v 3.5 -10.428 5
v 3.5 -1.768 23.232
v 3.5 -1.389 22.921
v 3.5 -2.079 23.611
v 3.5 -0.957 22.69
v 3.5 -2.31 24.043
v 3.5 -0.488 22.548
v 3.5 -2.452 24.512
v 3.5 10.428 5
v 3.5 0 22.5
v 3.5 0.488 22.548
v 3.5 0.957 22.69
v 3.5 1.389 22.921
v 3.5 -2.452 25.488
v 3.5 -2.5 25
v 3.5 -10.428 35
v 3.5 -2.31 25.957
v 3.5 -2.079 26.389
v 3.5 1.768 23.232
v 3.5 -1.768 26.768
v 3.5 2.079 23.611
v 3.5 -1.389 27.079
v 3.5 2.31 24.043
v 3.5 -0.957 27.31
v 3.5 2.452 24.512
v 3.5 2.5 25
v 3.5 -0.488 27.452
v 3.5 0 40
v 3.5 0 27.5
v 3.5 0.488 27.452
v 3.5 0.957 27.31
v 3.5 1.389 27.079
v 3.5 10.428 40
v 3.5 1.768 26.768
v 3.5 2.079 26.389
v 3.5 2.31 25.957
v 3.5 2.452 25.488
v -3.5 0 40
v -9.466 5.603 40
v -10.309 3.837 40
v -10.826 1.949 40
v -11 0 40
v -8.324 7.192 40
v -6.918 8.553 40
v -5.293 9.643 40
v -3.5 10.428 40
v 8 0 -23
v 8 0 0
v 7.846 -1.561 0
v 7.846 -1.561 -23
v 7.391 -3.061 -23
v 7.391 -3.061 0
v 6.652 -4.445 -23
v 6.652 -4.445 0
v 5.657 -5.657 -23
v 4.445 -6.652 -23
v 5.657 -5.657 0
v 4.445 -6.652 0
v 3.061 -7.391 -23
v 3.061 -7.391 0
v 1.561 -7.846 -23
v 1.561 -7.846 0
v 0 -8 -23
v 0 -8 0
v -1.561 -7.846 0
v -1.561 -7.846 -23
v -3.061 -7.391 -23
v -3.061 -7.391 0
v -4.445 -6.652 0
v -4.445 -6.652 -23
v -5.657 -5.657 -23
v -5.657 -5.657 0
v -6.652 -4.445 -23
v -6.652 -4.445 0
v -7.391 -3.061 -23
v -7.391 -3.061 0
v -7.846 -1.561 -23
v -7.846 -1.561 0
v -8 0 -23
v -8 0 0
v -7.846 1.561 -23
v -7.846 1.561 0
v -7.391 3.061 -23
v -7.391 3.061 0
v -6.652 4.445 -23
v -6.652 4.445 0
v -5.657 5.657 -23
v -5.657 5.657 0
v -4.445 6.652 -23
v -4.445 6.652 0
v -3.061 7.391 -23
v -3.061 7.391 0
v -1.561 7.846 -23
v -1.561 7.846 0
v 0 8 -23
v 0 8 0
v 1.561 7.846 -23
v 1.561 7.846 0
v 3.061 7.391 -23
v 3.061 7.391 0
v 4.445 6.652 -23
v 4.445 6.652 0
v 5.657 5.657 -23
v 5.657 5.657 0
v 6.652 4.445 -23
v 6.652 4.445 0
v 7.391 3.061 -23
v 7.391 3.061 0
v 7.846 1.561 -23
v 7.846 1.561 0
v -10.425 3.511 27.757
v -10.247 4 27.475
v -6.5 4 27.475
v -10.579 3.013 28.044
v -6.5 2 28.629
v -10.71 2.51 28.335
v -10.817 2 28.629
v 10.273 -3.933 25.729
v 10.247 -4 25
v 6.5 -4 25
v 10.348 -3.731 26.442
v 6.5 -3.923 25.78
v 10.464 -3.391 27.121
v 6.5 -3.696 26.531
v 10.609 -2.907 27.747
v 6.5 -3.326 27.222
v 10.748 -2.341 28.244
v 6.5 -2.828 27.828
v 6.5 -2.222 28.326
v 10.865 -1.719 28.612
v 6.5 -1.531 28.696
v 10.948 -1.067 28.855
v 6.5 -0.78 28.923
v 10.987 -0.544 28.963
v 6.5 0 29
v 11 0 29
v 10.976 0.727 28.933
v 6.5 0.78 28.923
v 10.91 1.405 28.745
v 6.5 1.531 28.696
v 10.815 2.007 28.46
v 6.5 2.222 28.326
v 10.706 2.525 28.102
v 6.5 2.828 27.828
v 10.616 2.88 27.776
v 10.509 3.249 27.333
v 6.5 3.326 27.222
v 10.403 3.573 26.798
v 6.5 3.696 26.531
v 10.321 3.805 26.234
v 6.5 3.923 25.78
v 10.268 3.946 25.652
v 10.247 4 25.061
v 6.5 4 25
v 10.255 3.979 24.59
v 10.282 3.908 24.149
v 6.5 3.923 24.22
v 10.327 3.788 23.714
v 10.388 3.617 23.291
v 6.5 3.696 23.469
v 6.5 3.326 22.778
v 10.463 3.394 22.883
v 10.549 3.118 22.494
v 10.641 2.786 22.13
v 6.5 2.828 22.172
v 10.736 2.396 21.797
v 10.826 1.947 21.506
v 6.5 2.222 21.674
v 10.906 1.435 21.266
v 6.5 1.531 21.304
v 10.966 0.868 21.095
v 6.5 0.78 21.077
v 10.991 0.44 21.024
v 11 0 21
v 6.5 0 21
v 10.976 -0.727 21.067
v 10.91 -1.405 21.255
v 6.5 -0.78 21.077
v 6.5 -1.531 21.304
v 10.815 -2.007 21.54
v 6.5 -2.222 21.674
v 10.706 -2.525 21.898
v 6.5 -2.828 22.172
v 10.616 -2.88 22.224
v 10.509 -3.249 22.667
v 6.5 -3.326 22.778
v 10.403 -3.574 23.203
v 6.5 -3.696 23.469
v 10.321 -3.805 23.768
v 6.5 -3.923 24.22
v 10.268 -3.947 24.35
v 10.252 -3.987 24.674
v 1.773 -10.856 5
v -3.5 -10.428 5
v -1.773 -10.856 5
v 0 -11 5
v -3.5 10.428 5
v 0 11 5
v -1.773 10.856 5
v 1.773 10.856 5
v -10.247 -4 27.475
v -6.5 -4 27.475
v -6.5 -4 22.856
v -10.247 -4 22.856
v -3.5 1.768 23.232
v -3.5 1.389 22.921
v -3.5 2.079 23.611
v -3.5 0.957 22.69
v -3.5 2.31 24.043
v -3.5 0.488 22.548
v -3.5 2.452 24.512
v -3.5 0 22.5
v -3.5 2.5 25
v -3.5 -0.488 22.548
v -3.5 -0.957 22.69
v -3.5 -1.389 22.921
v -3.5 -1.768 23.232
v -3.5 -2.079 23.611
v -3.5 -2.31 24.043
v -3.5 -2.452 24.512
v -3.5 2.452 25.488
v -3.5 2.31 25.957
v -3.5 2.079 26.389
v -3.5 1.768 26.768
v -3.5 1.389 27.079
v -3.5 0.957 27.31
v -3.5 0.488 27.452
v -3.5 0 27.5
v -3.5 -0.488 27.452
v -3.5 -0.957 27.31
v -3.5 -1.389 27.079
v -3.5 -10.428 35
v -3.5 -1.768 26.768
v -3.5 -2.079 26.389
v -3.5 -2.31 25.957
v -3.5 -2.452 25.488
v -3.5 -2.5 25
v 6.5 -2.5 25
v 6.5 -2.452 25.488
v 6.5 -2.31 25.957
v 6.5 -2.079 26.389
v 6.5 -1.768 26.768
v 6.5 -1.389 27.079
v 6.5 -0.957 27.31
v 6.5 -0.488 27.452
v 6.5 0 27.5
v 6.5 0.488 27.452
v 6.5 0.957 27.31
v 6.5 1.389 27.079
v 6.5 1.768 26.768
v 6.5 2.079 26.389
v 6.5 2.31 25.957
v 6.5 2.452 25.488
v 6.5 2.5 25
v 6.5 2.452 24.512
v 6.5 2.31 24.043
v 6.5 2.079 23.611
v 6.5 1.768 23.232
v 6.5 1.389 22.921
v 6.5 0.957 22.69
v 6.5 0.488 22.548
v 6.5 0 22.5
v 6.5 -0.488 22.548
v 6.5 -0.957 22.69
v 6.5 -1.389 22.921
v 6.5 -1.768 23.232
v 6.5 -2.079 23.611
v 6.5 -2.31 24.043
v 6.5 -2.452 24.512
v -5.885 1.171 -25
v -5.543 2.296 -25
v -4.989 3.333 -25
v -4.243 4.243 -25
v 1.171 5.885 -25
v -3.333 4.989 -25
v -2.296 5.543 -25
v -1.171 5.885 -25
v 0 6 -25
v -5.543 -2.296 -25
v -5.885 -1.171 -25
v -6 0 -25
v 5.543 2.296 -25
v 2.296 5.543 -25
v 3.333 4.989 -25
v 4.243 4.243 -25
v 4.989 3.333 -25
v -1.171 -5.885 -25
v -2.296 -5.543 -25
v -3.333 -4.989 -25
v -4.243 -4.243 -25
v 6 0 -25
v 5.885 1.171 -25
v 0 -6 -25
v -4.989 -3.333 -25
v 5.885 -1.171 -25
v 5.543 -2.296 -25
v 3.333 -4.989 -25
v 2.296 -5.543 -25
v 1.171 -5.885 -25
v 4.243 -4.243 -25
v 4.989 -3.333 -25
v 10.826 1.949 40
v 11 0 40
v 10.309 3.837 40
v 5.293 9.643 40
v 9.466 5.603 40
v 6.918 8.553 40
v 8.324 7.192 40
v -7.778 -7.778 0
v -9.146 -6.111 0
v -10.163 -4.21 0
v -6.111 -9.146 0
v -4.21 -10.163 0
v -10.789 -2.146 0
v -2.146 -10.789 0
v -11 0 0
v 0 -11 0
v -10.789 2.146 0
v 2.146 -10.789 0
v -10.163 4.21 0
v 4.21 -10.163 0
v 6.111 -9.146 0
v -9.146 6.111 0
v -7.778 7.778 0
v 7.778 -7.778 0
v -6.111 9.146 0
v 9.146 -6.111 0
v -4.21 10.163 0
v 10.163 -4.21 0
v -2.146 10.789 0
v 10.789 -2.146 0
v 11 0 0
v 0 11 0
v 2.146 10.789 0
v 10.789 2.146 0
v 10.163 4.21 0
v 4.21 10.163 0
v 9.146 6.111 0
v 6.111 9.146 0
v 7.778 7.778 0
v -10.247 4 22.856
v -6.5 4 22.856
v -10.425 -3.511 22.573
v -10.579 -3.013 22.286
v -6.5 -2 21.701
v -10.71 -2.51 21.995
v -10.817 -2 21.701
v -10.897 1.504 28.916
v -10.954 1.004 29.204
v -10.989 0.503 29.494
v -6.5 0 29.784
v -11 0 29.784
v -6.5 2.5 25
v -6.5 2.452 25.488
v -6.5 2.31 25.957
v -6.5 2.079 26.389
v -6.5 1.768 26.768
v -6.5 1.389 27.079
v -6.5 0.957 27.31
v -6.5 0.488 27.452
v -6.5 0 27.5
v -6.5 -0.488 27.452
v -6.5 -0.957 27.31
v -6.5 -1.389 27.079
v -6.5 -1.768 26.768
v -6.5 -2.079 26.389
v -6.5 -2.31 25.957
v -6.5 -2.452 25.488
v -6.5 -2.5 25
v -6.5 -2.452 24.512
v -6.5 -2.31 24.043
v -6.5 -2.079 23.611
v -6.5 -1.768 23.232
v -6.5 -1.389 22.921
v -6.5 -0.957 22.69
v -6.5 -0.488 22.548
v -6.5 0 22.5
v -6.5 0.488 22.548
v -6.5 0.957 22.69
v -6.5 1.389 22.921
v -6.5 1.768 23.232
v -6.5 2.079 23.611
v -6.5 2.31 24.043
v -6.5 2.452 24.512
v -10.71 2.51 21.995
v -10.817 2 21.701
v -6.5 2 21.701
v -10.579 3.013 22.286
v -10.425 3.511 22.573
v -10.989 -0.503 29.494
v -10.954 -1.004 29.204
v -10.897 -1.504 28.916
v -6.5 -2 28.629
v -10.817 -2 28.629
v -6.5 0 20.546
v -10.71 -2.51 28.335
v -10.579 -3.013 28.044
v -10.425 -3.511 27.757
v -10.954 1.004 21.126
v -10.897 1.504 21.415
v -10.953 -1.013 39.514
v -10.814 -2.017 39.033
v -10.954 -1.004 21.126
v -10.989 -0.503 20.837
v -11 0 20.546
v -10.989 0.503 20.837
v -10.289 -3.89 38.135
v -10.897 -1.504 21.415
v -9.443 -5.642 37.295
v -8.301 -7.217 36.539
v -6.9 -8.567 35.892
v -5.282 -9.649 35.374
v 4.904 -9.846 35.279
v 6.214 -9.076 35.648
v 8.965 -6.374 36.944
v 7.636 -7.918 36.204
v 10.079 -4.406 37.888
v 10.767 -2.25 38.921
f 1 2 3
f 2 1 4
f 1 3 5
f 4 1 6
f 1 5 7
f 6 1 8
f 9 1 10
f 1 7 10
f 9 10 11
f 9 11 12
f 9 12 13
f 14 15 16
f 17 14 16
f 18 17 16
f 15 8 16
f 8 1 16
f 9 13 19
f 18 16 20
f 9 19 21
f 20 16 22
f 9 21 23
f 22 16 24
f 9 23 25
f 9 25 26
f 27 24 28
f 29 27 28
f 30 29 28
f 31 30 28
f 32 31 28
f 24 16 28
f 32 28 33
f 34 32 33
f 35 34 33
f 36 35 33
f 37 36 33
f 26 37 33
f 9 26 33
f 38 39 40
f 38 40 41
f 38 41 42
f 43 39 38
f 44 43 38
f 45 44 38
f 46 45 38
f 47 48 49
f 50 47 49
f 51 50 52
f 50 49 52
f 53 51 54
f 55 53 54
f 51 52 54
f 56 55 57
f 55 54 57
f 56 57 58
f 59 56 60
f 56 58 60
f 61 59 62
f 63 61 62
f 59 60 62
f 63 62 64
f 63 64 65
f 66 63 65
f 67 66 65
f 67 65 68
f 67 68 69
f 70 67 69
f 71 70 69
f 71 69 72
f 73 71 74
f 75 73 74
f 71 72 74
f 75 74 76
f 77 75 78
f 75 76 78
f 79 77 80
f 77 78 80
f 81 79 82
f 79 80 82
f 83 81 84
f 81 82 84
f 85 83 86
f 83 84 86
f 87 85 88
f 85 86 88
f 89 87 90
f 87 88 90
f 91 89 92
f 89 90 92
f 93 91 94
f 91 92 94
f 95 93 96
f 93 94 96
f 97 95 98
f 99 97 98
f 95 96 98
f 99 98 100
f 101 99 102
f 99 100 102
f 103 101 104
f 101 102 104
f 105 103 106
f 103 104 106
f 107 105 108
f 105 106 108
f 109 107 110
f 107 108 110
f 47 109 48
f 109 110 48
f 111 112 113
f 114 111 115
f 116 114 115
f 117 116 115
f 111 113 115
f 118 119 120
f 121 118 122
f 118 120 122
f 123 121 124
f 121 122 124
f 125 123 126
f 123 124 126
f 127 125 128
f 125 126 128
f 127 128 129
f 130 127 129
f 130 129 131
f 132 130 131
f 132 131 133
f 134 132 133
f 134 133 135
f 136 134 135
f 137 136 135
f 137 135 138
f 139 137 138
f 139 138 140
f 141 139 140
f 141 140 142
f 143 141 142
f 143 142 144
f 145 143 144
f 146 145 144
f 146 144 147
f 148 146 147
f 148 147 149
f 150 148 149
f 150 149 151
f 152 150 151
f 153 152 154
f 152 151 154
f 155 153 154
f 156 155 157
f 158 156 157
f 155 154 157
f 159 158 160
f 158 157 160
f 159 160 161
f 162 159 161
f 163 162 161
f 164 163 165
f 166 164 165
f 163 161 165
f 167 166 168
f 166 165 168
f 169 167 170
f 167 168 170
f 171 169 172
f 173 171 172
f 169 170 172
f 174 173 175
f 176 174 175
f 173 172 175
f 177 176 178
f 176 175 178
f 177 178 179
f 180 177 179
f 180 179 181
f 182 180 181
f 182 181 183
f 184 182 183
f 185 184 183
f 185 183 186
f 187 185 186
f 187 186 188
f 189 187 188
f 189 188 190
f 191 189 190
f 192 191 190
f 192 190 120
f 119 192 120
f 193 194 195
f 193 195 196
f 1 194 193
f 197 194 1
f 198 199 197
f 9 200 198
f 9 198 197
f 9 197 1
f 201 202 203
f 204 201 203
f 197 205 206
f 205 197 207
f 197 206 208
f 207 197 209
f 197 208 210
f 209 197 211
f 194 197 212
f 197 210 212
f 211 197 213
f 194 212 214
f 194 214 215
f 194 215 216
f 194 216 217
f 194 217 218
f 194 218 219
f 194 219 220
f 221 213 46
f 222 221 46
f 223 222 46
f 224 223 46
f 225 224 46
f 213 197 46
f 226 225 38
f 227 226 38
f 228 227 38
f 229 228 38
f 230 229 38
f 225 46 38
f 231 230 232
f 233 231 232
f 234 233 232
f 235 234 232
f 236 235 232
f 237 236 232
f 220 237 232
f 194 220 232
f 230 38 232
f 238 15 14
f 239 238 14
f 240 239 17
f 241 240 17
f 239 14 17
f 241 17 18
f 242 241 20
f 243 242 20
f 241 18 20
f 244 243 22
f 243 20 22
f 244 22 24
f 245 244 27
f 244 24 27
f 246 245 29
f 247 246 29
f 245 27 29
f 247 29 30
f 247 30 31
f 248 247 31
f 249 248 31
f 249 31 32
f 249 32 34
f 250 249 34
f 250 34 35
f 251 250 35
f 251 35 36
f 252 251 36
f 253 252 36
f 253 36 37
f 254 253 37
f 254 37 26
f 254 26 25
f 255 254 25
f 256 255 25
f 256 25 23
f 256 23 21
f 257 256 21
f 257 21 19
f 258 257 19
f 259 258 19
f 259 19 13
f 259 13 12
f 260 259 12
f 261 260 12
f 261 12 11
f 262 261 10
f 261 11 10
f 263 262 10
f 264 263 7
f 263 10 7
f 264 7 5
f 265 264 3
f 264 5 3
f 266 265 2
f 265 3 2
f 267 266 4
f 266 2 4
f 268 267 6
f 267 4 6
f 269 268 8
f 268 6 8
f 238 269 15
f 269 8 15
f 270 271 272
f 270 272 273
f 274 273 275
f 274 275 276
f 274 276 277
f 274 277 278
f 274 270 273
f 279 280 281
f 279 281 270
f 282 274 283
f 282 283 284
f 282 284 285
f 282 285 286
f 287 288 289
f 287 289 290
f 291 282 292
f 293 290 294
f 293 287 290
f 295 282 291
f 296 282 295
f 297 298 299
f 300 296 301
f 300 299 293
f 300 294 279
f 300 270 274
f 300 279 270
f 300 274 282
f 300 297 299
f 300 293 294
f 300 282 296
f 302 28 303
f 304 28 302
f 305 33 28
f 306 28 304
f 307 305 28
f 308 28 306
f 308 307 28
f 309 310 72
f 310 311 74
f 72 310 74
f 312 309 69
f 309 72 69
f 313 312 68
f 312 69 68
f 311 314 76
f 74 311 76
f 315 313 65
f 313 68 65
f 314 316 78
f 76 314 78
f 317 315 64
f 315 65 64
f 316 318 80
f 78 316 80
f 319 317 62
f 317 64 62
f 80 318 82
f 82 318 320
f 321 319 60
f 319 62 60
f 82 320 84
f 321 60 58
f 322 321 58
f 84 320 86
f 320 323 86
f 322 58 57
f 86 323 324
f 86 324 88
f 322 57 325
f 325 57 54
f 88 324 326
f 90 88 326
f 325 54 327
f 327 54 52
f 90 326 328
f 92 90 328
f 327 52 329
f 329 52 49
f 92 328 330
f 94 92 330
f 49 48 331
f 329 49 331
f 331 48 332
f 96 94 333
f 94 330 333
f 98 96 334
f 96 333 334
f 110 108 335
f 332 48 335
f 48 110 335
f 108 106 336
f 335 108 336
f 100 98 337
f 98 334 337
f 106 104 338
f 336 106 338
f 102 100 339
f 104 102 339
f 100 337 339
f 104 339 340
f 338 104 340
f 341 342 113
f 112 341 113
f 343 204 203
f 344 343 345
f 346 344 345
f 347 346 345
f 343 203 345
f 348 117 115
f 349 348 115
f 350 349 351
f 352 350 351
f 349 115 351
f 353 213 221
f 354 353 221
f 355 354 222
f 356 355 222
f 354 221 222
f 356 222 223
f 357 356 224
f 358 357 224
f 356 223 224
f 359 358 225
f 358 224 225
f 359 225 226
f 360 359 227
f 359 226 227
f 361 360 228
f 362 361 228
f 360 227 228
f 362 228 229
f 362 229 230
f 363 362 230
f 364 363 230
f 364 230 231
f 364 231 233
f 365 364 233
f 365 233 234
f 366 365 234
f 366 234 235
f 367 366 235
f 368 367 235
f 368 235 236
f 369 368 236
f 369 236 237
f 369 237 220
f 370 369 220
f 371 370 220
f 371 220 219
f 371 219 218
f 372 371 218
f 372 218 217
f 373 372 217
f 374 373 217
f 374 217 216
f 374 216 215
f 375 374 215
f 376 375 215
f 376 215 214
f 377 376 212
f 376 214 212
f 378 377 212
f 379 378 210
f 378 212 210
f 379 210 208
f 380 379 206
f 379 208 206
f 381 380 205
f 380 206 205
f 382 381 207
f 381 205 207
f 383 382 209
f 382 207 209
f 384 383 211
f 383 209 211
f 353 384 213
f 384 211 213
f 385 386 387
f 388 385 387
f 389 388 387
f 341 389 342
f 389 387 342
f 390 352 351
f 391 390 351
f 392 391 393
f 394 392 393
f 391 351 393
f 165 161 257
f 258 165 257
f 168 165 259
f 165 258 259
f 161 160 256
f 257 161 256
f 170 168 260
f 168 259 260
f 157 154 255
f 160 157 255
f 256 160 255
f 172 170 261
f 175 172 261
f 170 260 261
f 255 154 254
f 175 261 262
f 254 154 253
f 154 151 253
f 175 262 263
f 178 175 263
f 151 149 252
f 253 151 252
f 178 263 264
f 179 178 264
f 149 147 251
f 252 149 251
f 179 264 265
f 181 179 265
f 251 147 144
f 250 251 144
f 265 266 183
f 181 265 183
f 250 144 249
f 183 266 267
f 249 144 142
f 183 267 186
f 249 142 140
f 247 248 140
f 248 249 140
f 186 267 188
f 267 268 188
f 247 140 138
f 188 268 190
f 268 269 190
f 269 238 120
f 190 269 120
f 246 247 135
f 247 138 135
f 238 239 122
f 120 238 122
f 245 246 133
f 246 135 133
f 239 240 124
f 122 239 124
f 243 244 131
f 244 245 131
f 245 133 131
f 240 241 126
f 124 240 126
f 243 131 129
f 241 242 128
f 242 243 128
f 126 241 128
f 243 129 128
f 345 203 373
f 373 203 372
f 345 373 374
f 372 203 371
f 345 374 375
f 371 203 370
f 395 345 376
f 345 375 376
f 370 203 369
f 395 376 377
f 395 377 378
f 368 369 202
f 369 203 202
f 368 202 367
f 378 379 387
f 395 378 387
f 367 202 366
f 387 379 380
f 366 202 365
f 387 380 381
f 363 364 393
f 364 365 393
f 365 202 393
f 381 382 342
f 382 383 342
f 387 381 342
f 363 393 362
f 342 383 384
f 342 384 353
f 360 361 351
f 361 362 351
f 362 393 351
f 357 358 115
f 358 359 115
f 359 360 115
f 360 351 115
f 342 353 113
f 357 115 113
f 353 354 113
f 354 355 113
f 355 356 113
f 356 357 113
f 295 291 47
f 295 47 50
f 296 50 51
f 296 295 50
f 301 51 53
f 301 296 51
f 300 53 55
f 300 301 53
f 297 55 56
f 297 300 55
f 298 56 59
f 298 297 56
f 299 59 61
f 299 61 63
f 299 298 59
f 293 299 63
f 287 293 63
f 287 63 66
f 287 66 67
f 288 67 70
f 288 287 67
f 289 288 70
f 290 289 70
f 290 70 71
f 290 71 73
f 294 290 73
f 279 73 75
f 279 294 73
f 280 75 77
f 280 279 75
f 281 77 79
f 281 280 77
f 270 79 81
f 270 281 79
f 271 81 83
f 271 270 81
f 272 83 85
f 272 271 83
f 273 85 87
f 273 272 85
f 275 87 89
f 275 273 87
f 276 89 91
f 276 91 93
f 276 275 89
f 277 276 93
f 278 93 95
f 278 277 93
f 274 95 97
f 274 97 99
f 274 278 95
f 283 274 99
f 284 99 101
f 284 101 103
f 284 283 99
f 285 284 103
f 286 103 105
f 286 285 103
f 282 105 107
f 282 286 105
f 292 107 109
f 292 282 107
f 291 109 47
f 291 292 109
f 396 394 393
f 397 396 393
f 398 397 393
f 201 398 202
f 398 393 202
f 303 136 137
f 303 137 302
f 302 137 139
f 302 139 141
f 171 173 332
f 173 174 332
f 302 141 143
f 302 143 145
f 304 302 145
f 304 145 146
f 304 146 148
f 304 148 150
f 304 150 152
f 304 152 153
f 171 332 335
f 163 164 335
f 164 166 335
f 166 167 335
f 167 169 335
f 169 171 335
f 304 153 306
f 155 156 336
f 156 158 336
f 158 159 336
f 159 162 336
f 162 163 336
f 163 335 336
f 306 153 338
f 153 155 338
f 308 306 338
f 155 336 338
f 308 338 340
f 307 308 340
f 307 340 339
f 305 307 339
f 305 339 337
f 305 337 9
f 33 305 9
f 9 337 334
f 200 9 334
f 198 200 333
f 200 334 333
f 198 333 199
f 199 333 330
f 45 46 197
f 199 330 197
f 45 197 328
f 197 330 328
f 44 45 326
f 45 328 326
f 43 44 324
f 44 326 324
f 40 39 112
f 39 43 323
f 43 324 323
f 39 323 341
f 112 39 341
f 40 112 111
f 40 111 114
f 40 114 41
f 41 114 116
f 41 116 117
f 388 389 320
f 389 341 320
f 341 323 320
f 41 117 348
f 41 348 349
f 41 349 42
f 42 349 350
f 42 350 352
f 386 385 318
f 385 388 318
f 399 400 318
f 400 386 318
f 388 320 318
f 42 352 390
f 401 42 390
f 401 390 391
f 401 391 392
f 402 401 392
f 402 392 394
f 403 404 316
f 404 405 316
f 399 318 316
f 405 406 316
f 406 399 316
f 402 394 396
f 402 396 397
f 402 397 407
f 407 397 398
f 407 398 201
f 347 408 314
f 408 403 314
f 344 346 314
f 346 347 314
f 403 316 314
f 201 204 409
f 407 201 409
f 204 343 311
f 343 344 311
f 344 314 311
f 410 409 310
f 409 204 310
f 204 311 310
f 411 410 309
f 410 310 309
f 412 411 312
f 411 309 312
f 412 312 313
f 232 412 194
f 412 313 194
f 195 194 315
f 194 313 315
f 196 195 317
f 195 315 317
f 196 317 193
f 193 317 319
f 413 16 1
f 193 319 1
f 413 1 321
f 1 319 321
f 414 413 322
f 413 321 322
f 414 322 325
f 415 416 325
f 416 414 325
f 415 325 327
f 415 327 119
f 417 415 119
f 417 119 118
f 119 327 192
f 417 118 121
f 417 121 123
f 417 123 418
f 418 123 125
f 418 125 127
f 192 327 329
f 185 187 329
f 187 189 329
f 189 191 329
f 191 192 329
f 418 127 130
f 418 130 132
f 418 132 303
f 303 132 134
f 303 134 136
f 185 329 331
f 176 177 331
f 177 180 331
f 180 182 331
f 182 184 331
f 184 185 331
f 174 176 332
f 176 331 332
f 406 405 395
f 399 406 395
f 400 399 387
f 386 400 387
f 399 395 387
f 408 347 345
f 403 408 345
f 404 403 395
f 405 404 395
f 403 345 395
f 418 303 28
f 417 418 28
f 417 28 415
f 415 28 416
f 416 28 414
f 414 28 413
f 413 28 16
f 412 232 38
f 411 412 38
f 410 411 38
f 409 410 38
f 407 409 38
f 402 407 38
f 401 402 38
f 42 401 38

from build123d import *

# Parameters (mm, degrees)
F0_R      = 11
F1_DEPTH  = 40
F3_DEPTH  = 35
F6_DEPTH  = 7.501
F8_DEPTH  = 7.501
F5_R      = 8
F9_DEPTH  = 25
F10_R     = 2.5
F11_DEPTH = 7.501
F12_R     = 2.5
F13_DEPTH = 7.5010001
F14_SIZE  = 2
F17_DEPTH = 4.5010001
F19_R     = 4
F20_DEPTH = 4.5010001


with BuildPart() as f1:
    # F0 (on Top) → F1 (new body)
    with BuildSketch(Plane.XY):
        Circle(F0_R)
    extrude(amount=F1_DEPTH)

    # F2 (on face) → F3 (cut)
    with BuildSketch(Plane.XY.offset(40)):
        with BuildLine():
            ThreePointArc((-3.5, -10.4283268073), (0, -11), (3.5, -10.4283268073))
            Line((3.5, -10.4283268073), (3.5, 10.4283268073))
            ThreePointArc((3.5, 10.4283268073), (0, 11), (-3.5, 10.4283268073))
            Line((-3.5, 10.4283268073), (-3.5, -10.4283268073))
        make_face()
    extrude(amount=-F3_DEPTH, mode=Mode.SUBTRACT)

    # F4 (on face) → F6 (cut, through all)
    with BuildSketch(Plane.YZ.offset(-3.5)):
        Polygon((-10.4283268073, 35), (0, 40), (-10.4283268073, 40), align=None)
    extrude(amount=-F6_DEPTH, mode=Mode.SUBTRACT)

    # F7 (on face) → F8 (cut, through all)
    with BuildSketch(Plane(origin=(3.5, 0, 0), x_dir=(0, -1, 0), z_dir=(-1, 0, 0))):
        Polygon((10.4283268073, 40), (0, 40), (10.4283268073, 35), align=None)
    extrude(amount=-F8_DEPTH, mode=Mode.SUBTRACT)

    # F5 (on face) → F9 (join)
    with BuildSketch(Plane(origin=(0, 0, 0), x_dir=(1, 0, 0), z_dir=(0, 0, -1))):
        Circle(F5_R)
    extrude(amount=F9_DEPTH)

    # F10 (on face) → F11 (cut, through all)
    with BuildSketch(Plane(origin=(3.5, 0, 0), x_dir=(0, -1, 0), z_dir=(-1, 0, 0))):
        with Locations((0, 25)):
            Circle(F10_R)
    extrude(amount=-F11_DEPTH, mode=Mode.SUBTRACT)

    # F12 (on face) → F13 (cut, through all)
    with BuildSketch(Plane.YZ.offset(-3.5)):
        with Locations((0, 25)):
            Circle(F12_R)
    extrude(amount=-F13_DEPTH, mode=Mode.SUBTRACT)

    # F14
    f14_edges = [f1.edges().sort_by_distance(p)[0] for p in [
        (-8, 0, -25),
    ]]
    chamfer(f14_edges, length=F14_SIZE)

    # F16 (on offset) → F17 (cut, through all)
    with BuildSketch(Plane.YZ.offset(-6.5)):
        with BuildLine():
            ThreePointArc((1.9999999297, 21.7011209295), (3.4641015949, 23.1652225501), (4, 25.1652225852))
            ThreePointArc((4, 25.1652225852), (3.4641016169, 27.1652225821), (2.0000000062, 28.6293241968))
            ThreePointArc((2.0000000062, 28.6293241968), (7.14e-08, 29.1652225852), (-1.9999998825, 28.6293242682))
            ThreePointArc((-1.9999998825, 28.6293242682), (-3.4641015812, 27.165222644), (-4, 25.1652225852))
            ThreePointArc((-4, 25.1652225852), (-3.4641016169, 23.1652225883), (-2.0000000062, 21.7011209736))
            ThreePointArc((-2.0000000062, 21.7011209736), (-4.42e-08, 21.1652225852), (1.9999999297, 21.7011209295))
        make_face()
        with BuildLine():
            Line((4, 22.8558215084), (4, 25.1652225852))
            ThreePointArc((4, 25.1652225852), (3.4641015949, 23.1652225501), (1.9999999297, 21.7011209295))
            Line((1.9999999297, 21.7011209295), (4, 22.8558215084))
        make_face()
        with BuildLine():
            ThreePointArc((2.0000000062, 28.6293241968), (3.4641016169, 27.1652225821), (4, 25.1652225852))
            Line((4, 25.1652225852), (4, 27.474623662))
            Line((4, 27.474623662), (2.0000000062, 28.6293241968))
        make_face()
        with BuildLine():
            ThreePointArc((-1.9999998825, 28.6293242682), (7.14e-08, 29.1652225852), (2.0000000062, 28.6293241968))
            Line((2.0000000062, 28.6293241968), (0, 29.7840247387))
            Line((0, 29.7840247387), (-1.9999998825, 28.6293242682))
        make_face()
        with BuildLine():
            Line((0, 20.5464204317), (1.9999999297, 21.7011209295))
            ThreePointArc((1.9999999297, 21.7011209295), (-4.42e-08, 21.1652225852), (-2.0000000062, 21.7011209736))
            Line((-2.0000000062, 21.7011209736), (0, 20.5464204317))
        make_face()
        with BuildLine():
            ThreePointArc((-4, 25.1652225852), (-3.4641015812, 27.165222644), (-1.9999998825, 28.6293242682))
            Line((-1.9999998825, 28.6293242682), (-4, 27.474623662))
            Line((-4, 27.474623662), (-4, 25.1652225852))
        make_face()
        with BuildLine():
            Line((-4, 22.8558215084), (-2.0000000062, 21.7011209736))
            ThreePointArc((-2.0000000062, 21.7011209736), (-3.4641016169, 23.1652225883), (-4, 25.1652225852))
            Line((-4, 25.1652225852), (-4, 22.8558215084))
        make_face()
    extrude(amount=-F17_DEPTH, mode=Mode.SUBTRACT)

    # F19 (on offset) → F20 (cut, through all)
    with BuildSketch(Plane(origin=(6.5, 0, 0), x_dir=(0, -1, 0), z_dir=(-1, 0, 0))):
        with Locations((0, 25)):
            Circle(F19_R)
    extrude(amount=-F20_DEPTH, mode=Mode.SUBTRACT)


solid = f1.part
